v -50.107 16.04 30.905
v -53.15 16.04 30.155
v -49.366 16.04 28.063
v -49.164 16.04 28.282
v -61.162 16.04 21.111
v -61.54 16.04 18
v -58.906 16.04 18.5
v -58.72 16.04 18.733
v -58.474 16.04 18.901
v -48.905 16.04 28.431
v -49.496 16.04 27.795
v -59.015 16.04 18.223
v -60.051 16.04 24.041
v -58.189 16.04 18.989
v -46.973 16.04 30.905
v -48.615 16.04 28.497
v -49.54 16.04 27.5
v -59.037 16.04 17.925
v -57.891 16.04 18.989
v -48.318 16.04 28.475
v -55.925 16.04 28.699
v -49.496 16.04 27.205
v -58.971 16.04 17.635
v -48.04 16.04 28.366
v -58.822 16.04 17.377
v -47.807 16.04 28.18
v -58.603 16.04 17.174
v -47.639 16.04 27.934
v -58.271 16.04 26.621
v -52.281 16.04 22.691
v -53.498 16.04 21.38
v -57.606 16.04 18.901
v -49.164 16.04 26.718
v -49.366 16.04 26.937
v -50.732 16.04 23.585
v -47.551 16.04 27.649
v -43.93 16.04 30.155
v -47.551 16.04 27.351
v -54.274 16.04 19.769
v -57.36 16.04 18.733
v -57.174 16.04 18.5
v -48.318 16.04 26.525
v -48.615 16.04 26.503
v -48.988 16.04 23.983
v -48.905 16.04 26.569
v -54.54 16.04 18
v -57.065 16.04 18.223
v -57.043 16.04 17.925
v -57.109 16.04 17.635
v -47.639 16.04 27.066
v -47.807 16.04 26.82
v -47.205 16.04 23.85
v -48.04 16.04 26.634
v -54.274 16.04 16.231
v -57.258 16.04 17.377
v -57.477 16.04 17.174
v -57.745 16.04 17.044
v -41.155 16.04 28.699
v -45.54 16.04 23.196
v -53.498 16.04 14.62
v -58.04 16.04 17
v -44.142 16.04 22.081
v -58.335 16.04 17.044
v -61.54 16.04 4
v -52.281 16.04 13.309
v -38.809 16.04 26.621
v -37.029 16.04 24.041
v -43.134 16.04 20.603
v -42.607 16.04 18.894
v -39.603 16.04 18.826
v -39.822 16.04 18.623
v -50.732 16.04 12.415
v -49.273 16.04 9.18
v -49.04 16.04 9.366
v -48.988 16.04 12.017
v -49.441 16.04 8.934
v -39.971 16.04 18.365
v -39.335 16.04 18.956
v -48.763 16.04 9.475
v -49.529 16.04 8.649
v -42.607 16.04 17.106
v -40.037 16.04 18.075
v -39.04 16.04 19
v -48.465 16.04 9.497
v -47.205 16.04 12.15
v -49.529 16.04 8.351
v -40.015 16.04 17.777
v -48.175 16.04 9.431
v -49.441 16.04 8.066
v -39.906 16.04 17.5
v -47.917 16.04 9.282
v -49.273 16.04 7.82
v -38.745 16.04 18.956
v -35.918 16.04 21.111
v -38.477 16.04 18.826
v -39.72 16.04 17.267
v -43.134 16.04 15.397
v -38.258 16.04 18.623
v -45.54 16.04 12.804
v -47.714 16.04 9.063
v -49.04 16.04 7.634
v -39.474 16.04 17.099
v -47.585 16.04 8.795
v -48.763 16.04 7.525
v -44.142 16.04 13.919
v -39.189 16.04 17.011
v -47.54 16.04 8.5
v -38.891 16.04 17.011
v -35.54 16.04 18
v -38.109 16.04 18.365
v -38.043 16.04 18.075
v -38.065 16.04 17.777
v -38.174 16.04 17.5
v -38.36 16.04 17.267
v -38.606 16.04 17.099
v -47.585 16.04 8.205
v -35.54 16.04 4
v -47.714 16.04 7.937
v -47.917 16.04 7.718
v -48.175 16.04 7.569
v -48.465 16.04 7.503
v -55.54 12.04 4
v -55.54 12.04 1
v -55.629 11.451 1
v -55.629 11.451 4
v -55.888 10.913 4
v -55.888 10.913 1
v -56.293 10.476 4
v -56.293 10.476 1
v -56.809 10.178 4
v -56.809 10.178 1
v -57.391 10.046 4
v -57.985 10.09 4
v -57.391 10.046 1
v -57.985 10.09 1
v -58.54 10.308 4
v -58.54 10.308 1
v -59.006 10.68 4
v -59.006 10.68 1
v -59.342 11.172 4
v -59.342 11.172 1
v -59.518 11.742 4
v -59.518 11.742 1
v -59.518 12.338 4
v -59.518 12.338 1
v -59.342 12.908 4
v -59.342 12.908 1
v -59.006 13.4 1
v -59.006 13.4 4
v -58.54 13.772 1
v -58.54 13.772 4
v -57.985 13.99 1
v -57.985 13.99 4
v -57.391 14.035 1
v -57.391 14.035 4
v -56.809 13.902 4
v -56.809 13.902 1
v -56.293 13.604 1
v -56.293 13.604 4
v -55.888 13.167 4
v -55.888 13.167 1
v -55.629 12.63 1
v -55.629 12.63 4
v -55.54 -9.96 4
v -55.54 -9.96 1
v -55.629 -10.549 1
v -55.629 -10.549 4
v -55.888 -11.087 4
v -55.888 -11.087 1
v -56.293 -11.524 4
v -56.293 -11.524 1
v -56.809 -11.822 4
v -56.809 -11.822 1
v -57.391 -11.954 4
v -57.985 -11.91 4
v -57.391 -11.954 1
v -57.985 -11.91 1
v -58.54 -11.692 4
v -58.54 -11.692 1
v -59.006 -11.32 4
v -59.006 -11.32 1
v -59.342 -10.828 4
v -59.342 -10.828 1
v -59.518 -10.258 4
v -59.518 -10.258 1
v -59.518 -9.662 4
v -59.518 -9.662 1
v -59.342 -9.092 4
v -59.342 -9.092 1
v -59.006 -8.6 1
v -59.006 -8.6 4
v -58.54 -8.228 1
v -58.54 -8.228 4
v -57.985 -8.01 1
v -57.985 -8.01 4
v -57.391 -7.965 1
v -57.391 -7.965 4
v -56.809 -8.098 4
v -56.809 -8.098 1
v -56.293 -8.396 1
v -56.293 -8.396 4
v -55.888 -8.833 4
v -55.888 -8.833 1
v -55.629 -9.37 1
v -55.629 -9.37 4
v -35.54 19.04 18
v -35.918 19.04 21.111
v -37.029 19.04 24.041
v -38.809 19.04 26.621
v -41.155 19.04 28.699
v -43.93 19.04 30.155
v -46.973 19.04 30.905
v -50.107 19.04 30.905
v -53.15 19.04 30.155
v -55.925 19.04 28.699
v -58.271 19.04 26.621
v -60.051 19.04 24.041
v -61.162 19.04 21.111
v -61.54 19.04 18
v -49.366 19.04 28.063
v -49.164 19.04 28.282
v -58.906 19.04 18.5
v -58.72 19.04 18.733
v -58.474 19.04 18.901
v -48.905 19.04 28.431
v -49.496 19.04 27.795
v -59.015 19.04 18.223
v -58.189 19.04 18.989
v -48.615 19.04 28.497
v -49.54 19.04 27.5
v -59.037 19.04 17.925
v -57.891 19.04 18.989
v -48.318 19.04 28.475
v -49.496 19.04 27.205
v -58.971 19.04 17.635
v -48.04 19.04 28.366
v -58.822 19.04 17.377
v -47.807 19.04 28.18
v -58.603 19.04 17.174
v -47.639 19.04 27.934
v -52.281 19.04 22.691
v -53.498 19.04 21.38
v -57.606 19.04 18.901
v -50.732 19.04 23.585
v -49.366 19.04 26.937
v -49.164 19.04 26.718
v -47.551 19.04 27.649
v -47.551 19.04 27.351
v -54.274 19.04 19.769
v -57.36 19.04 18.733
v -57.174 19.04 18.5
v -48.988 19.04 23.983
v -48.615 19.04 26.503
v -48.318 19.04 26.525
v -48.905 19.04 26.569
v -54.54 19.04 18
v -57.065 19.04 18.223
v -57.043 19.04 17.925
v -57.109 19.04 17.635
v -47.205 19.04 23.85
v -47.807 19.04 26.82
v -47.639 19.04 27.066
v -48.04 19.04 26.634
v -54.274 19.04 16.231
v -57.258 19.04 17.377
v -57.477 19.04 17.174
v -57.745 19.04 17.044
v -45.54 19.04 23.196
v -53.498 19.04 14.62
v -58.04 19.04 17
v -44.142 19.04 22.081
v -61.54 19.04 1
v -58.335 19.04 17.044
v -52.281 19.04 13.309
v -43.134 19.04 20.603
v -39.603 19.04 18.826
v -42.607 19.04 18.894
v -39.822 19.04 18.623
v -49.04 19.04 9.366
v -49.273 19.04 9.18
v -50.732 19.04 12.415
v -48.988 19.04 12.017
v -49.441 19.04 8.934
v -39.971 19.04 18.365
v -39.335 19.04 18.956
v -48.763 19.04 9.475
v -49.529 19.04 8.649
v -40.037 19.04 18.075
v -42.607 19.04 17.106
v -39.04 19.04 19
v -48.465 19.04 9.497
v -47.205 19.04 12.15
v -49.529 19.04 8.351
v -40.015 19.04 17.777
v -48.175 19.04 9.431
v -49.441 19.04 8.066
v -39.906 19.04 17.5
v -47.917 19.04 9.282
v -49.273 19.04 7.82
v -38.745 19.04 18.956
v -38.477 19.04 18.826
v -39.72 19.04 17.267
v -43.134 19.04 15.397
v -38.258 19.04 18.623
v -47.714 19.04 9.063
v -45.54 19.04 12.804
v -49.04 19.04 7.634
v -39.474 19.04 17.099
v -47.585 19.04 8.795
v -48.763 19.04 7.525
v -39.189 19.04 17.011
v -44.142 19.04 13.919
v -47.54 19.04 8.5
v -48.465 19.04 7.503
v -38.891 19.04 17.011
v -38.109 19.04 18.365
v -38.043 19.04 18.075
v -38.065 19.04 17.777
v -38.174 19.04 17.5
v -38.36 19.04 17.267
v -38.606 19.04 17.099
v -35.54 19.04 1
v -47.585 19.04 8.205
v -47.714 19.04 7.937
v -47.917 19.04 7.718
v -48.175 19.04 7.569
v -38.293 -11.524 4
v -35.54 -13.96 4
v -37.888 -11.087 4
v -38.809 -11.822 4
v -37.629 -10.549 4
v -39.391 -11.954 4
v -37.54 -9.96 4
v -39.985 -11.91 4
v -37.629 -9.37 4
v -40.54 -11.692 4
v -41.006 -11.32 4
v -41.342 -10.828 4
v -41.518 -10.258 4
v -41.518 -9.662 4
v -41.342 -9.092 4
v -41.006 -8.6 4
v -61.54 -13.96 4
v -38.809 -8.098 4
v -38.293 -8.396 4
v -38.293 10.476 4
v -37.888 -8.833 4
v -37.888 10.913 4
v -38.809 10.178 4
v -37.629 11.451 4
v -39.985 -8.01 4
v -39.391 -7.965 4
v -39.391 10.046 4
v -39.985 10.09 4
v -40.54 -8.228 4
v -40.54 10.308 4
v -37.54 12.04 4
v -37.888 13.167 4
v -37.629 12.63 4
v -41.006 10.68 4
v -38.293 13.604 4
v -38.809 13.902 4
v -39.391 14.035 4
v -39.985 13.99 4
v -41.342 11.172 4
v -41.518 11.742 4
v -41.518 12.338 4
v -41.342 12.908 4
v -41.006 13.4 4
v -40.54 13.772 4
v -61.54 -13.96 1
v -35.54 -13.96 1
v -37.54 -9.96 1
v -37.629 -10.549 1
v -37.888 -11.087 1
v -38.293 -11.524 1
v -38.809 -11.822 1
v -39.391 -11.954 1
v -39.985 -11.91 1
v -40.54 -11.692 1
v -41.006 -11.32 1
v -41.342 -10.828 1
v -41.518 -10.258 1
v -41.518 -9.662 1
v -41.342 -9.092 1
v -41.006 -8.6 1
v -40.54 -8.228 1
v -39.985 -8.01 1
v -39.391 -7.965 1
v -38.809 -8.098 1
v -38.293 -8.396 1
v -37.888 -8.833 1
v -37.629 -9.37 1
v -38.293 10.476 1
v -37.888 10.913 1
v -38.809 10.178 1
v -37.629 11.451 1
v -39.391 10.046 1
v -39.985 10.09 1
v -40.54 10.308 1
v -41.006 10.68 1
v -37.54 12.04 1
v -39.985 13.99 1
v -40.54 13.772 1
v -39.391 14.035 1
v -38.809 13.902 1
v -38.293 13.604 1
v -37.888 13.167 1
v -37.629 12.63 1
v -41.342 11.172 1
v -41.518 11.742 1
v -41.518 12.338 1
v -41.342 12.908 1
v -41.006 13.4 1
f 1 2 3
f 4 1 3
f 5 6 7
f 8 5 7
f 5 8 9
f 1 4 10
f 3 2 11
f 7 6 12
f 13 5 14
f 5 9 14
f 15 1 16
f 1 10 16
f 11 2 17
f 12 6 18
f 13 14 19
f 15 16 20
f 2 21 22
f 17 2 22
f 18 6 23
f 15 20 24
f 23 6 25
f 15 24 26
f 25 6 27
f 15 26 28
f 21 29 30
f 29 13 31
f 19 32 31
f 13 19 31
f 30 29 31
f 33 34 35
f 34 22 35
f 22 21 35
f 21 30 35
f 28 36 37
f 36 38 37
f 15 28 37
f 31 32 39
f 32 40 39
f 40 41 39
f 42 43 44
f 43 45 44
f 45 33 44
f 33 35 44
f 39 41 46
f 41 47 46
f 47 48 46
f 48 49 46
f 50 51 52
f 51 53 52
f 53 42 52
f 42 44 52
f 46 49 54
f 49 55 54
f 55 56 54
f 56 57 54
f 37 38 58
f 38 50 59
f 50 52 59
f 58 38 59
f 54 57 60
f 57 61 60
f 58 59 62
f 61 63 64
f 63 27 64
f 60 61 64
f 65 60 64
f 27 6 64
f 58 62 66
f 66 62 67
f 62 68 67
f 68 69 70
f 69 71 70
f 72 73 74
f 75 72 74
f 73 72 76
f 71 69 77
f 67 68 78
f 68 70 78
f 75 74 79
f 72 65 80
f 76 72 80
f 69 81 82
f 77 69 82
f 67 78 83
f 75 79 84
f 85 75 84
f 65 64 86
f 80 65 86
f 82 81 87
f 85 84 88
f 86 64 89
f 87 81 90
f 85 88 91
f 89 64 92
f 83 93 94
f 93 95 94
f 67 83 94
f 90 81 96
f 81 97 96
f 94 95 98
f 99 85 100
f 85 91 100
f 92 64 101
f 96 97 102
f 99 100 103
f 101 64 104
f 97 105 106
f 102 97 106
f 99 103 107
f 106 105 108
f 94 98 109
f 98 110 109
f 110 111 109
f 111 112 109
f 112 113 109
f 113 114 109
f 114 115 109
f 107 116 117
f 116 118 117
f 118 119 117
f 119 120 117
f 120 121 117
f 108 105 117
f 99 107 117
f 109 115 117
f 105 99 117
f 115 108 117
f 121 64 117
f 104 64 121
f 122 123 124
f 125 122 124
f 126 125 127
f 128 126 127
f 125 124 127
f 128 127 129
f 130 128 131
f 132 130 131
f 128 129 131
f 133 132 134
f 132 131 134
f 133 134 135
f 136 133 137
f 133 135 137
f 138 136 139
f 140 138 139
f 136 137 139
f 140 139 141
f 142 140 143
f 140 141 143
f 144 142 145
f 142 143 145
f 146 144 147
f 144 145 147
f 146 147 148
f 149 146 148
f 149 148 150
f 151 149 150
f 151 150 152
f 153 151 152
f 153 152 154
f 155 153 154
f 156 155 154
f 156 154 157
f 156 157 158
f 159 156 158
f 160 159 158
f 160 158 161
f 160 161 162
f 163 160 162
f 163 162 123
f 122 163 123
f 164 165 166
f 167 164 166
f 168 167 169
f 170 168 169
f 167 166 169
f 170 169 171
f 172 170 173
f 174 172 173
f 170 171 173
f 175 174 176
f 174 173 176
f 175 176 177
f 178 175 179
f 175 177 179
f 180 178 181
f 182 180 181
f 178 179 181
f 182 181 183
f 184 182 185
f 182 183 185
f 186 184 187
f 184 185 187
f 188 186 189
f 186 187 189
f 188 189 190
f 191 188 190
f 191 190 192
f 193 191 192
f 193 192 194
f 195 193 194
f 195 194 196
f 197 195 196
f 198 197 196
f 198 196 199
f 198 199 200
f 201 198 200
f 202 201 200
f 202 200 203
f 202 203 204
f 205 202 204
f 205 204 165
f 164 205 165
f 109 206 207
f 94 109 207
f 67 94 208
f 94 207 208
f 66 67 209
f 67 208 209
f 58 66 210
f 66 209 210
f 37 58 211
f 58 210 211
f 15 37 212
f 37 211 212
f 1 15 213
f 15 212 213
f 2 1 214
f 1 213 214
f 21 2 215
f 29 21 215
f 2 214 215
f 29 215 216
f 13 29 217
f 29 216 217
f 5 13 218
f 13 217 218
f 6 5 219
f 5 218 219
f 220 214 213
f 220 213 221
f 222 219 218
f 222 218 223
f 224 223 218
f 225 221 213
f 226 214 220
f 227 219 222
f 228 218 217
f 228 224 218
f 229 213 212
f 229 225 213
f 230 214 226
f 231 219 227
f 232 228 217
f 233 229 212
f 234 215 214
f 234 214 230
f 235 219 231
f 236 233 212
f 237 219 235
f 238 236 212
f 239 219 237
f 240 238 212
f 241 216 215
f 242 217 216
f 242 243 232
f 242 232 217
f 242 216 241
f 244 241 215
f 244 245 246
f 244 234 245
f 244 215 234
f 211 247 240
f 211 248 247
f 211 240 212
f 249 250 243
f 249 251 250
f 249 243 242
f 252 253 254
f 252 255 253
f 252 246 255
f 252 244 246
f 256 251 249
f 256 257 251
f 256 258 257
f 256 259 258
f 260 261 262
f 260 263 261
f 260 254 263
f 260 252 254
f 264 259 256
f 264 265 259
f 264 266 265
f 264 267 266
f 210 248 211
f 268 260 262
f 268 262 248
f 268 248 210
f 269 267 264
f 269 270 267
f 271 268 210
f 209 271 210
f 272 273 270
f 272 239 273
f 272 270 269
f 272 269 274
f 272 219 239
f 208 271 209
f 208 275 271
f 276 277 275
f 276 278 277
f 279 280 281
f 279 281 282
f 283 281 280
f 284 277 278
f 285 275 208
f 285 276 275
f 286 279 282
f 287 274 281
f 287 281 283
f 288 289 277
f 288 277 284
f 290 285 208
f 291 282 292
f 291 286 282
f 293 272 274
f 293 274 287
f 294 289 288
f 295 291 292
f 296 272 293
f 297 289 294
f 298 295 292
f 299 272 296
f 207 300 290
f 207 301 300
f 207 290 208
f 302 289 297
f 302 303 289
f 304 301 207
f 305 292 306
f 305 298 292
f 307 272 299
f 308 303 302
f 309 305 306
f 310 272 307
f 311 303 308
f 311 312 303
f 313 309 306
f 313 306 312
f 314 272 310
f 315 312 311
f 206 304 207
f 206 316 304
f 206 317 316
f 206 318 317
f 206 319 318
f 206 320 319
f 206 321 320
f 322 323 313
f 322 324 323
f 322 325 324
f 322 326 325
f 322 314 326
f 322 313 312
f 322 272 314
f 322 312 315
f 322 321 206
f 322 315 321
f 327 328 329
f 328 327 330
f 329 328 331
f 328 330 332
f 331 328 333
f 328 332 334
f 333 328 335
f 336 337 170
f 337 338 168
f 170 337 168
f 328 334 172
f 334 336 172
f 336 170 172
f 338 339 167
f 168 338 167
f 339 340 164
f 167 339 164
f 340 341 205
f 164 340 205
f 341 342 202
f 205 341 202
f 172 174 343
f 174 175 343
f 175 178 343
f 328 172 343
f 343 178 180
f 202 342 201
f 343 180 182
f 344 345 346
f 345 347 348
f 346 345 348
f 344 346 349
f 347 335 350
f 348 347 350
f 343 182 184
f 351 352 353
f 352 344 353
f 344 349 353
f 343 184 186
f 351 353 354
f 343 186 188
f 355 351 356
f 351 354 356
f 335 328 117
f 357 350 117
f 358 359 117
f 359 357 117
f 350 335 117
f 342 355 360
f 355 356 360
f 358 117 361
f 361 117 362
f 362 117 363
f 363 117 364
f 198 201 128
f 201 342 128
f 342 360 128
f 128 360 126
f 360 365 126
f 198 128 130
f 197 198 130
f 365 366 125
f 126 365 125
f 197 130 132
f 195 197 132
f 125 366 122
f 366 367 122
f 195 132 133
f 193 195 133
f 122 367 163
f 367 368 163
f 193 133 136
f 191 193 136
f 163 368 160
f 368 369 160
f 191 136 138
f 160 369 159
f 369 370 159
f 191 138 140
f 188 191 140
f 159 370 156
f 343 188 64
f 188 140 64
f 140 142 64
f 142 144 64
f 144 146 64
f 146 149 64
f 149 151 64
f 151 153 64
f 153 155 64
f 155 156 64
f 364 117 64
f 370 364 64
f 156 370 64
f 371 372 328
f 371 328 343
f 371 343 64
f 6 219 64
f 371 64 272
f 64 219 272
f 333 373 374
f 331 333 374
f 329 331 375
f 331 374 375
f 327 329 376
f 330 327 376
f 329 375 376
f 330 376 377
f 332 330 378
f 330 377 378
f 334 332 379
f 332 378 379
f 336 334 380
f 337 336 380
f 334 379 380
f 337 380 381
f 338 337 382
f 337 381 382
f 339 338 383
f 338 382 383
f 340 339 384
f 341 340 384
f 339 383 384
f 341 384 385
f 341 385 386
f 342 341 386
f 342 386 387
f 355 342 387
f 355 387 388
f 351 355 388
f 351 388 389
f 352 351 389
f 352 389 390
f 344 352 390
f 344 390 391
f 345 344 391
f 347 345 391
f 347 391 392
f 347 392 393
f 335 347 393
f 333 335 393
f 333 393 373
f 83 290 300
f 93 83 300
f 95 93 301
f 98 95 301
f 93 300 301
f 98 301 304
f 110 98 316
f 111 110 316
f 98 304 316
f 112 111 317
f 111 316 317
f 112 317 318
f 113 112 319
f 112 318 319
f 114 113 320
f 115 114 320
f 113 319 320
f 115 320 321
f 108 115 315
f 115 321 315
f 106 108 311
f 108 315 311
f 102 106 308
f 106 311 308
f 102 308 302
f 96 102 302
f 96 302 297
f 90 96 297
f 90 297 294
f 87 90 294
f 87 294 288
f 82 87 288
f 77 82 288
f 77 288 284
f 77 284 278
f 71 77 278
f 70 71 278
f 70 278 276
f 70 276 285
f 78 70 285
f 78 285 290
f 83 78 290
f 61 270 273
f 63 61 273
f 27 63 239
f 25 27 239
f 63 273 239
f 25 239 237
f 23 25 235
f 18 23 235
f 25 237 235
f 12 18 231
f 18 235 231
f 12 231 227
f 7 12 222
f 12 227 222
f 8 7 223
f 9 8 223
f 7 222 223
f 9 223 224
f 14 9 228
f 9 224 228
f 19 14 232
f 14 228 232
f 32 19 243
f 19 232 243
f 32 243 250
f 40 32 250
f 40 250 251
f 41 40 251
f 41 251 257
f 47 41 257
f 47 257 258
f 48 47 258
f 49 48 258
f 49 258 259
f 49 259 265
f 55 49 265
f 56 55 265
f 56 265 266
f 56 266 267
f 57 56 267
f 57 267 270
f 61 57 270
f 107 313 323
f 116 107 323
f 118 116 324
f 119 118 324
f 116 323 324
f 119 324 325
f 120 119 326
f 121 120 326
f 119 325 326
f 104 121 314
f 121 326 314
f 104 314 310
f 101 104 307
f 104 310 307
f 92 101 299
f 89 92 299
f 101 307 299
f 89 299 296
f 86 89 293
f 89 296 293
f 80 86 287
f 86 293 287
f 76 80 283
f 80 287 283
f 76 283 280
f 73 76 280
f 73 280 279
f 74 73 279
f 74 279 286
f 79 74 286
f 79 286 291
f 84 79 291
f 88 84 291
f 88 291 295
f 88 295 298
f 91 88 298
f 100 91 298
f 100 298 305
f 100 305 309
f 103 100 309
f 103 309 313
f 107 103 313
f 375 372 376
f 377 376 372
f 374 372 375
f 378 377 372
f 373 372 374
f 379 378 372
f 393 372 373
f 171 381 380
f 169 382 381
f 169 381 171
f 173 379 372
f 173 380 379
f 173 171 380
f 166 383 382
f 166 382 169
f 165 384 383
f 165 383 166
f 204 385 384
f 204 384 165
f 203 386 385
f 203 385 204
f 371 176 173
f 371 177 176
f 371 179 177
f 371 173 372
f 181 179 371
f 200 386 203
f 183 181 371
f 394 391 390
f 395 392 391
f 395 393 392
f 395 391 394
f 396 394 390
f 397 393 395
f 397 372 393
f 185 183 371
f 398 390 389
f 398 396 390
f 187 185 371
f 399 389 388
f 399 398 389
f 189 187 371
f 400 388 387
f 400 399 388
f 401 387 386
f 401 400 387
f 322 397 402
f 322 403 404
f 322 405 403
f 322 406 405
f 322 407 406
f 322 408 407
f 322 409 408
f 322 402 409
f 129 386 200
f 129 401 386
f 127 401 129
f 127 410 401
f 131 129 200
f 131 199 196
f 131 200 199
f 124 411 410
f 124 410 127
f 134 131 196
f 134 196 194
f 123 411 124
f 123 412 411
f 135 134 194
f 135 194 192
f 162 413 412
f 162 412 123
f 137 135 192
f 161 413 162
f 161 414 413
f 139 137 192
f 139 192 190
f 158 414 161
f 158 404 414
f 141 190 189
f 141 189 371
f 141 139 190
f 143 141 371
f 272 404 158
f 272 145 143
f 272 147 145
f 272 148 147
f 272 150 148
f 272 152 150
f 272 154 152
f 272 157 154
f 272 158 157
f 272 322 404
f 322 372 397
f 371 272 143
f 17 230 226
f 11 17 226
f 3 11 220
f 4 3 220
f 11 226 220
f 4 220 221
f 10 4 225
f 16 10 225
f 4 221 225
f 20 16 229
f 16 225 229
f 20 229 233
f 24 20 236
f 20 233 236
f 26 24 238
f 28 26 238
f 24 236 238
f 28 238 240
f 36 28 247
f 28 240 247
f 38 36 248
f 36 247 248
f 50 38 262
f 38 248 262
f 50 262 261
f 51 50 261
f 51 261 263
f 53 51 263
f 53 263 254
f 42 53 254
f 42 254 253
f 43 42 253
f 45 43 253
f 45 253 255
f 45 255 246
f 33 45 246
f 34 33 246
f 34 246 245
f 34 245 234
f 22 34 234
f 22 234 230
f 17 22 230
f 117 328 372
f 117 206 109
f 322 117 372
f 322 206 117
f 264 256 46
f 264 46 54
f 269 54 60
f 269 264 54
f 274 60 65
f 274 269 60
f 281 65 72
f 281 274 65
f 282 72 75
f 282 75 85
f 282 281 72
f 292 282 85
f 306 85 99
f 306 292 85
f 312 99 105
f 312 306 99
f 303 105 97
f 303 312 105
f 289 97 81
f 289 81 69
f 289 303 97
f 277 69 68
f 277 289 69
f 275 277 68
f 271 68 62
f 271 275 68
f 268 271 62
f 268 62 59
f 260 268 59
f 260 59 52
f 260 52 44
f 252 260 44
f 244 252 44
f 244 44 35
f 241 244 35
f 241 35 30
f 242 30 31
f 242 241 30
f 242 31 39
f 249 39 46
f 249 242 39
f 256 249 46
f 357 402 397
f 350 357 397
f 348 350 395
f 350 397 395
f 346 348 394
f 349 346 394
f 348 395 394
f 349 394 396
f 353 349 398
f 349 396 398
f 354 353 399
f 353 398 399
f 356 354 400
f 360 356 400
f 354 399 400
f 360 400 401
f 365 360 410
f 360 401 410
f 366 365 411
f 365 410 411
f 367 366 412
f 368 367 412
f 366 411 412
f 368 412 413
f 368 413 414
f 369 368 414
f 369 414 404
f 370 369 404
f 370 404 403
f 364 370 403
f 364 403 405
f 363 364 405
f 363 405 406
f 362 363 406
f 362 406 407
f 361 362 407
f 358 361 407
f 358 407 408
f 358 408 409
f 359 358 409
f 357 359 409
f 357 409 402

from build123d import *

# Parameters (mm, degrees)
SKETCH121_R             = 6
PAD085_DEPTH            = 3
SKETCH122_W             = 26
SKETCH122_H             = 3
PAD086_DEPTH            = 30
SKETCH123_R             = 2
POCKET048_DEPTH         = 30.001
SKETCH124_R             = 1
POCKET049_DEPTH         = 136.248276
POLARPATTERN018_COUNT   = 4
BODY050_PLACEMENT_ANGLE = 180


with BuildPart() as part:
    # Sketch121 → Pad085 (new body)
    with BuildSketch(Plane.XZ):
        with BuildLine():
            Line((-13, 17), (13, 17))
            Line((13, 17), (13, 0))
            ThreePointArc((-13, 0), (0, -13), (13, 0))
            Line((-13, 17), (-13, 0))
        make_face()
        Circle(SKETCH121_R, mode=Mode.SUBTRACT)
    extrude(amount=PAD085_DEPTH)

    # Sketch122 (on Face7 of Pad085) → Pad086 (join)
    with BuildSketch(Plane.XZ.offset(3)):
        with Locations((0, 15.5)):
            Rectangle(SKETCH122_W, SKETCH122_H)
    extrude(amount=PAD086_DEPTH)

    # Sketch123 (on Face5 of Pad086) → Pocket048 (cut, through all)
    with BuildSketch(Plane(origin=(0, 0, 17), x_dir=(-1, 0, 0), z_dir=(0, 0, 1))):
        with Locations((-9, 7)):
            Circle(SKETCH123_R)
        with Locations((9, 7)):
            Circle(SKETCH123_R)
        with Locations((-9, 29)):
            Circle(SKETCH123_R)
        with Locations((9, 29)):
            Circle(SKETCH123_R)
    extrude(amount=-POCKET048_DEPTH, mode=Mode.SUBTRACT)

    # Sketch124 (on Face4 of Pocket048) → Pocket049 (cut, through all)
    with BuildSketch(Plane(origin=(0, 0, 0), x_dir=(1, 0, 0), z_dir=(0, 1, 0))):
        with Locations((0, 9.5)):
            Circle(SKETCH124_R)
    pocket049 = extrude(amount=-POCKET049_DEPTH, mode=Mode.SUBTRACT)

    # PolarPattern018: Pocket049 ×4 about axis
    polarpattern018_axis = Axis((0, 0, 0), (0, 1, 0))
    for i in range(1, POLARPATTERN018_COUNT):
        add(pocket049.rotate(polarpattern018_axis, i * 360 / POLARPATTERN018_COUNT), mode=Mode.SUBTRACT)


with BuildPart() as part_1:
    # Body050 placement: moved
    add(part.part.moved(Location((-48.540115, 19.040115, 18))).rotate(Axis((-48.540115, 19.040115, 18), (0, 1, 0)), BODY050_PLACEMENT_ANGLE))


solid = part_1.part
